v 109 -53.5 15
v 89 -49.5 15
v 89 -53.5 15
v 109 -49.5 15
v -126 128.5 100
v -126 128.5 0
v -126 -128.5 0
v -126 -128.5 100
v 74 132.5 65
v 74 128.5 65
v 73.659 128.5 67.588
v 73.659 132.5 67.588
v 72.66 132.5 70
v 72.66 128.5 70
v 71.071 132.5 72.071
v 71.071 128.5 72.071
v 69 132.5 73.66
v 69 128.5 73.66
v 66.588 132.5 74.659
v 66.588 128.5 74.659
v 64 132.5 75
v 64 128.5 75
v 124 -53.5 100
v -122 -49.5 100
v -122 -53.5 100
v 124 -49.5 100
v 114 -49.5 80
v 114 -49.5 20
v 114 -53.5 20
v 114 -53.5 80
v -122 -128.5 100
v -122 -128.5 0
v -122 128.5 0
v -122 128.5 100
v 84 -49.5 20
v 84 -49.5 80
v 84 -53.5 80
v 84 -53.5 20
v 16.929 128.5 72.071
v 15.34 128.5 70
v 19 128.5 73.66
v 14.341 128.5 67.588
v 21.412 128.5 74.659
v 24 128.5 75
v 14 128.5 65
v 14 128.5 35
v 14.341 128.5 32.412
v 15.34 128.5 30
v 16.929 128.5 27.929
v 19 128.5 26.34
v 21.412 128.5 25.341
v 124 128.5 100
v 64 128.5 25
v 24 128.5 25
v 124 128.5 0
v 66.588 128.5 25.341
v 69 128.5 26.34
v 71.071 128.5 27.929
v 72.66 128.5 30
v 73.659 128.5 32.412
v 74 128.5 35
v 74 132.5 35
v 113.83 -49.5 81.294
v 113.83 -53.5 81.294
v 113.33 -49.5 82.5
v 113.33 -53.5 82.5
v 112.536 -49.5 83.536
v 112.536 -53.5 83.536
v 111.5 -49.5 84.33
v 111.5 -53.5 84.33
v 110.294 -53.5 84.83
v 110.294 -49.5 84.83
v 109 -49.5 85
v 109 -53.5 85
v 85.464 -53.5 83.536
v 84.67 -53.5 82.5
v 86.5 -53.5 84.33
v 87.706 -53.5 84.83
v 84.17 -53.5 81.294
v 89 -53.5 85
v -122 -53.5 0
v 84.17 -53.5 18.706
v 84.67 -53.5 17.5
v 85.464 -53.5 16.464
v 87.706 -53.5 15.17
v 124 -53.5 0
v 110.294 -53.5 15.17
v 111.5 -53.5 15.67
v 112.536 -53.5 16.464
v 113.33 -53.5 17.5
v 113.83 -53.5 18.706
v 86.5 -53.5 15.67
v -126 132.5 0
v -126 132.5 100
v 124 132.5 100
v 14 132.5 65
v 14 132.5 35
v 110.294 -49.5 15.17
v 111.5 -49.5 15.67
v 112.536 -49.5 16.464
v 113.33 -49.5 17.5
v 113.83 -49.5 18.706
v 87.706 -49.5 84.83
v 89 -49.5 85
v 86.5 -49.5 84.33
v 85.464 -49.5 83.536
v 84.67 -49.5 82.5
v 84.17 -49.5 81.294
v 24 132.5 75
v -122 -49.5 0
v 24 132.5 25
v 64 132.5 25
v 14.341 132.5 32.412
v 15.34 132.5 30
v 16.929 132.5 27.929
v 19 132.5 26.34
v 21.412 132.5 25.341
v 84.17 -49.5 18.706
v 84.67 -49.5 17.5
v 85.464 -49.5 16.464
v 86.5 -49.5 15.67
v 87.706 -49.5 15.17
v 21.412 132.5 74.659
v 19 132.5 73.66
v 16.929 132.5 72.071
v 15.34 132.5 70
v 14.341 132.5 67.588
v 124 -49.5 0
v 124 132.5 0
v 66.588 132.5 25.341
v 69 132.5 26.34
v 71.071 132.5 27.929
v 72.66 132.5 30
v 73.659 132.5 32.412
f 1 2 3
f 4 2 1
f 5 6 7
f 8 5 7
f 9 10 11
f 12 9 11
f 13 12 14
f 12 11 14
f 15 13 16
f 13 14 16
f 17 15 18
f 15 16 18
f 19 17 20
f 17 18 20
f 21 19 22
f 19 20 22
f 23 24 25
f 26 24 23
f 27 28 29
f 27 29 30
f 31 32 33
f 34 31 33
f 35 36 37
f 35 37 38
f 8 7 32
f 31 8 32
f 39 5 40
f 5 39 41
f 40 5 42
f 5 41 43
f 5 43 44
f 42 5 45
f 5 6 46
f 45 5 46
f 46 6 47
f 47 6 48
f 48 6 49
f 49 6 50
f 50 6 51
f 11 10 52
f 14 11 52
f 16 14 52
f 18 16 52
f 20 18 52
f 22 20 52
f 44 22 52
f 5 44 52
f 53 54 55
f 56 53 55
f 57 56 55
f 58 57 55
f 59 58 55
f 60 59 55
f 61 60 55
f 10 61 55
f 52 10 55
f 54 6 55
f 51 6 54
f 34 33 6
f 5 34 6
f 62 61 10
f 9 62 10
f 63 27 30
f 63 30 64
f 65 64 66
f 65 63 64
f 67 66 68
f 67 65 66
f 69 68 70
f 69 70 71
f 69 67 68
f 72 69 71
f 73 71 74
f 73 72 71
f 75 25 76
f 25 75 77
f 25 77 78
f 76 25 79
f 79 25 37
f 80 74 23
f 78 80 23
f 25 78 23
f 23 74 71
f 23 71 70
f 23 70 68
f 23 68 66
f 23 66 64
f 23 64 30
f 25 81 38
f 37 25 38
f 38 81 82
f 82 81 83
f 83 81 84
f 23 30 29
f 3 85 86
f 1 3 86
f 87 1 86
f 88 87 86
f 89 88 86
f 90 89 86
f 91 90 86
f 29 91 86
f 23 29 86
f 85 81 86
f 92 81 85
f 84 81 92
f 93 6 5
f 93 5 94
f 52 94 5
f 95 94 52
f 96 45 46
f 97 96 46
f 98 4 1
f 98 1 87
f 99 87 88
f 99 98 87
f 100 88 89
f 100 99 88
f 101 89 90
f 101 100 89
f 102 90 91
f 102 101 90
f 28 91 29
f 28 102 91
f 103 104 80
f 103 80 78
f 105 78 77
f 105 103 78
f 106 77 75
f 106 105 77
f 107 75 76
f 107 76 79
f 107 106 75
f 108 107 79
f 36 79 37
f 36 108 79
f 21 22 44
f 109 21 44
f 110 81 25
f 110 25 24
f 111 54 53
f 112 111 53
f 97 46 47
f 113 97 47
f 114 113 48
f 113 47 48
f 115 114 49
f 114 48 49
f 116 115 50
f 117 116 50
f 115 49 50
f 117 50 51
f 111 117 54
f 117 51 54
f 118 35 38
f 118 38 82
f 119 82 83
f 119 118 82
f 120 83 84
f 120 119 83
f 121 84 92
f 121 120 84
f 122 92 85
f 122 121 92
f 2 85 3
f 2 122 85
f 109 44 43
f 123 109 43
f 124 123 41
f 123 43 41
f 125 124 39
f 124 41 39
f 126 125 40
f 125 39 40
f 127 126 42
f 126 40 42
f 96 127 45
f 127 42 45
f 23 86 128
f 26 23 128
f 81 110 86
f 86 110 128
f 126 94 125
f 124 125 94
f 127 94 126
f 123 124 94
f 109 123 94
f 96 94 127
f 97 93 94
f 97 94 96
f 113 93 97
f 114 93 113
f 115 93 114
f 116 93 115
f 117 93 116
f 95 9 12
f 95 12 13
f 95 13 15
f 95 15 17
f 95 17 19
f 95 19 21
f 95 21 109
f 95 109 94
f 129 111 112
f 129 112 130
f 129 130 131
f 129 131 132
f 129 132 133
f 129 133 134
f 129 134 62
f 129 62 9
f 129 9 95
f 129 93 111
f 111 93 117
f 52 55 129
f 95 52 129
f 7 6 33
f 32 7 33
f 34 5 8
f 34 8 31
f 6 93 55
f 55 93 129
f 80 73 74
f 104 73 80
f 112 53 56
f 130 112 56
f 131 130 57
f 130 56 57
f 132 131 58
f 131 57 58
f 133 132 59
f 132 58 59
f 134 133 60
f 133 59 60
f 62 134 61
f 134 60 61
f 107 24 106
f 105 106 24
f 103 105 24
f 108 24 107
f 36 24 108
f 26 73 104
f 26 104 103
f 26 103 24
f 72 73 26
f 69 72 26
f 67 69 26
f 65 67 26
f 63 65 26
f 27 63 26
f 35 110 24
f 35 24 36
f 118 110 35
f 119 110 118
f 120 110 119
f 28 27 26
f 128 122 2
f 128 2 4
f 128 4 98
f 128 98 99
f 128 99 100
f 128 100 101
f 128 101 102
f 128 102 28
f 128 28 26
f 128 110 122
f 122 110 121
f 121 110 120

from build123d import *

# Parameters (mm, degrees)
SKETCH1_W           = 250
SKETCH1_H           = 4
BOSS_EXTRUDE1_DEPTH = 100
BOSS_EXTRUDE2_DEPTH = 100
SKETCH1_4_W         = 246
SKETCH1_4_H         = 4
BOSS_EXTRUDE3_DEPTH = 100
CUT_EXTRUDE1_DEPTH  = 4
CUT_EXTRUDE2_START  = -4
CUT_EXTRUDE2_DEPTH  = 4


with BuildPart() as part:
    # Sketch1 → Boss-Extrude1 (new body)
    with BuildSketch(Plane.XY):
        with Locations((-1, 130.5)):
            Rectangle(SKETCH1_W, SKETCH1_H)
    extrude(amount=BOSS_EXTRUDE1_DEPTH)

    # Sketch3 → Cut-Extrude2 (cut)
    with BuildSketch(Plane(origin=(0, 132.5, 0), x_dir=(1, 0, 0), z_dir=(0, 1, 0)).offset(CUT_EXTRUDE2_START)):
        with BuildLine():
            Line((14, -65), (14, -35))
            ThreePointArc((14, -35), (16.928932188, -27.928932188), (24, -25))
            Line((24, -25), (64, -25))
            ThreePointArc((64, -25), (71.071067812, -27.928932188), (74, -35))
            Line((74, -35), (74, -65))
            ThreePointArc((74, -65), (71.071067812, -72.071067812), (64, -75))
            Line((64, -75), (24, -75))
            ThreePointArc((24, -75), (16.928932188, -72.071067812), (14, -65))
        make_face()
    extrude(amount=CUT_EXTRUDE2_DEPTH, mode=Mode.SUBTRACT)


with BuildPart() as body_2:
    # Sketch1<3> → Boss-Extrude2 (new body)
    with BuildSketch(Plane.XY):
        Polygon((-122, -128.5), (-122, -53.5), (-122, -49.5), (-122, 128.5), (-126, 128.5), (-126, -128.5), align=None)
    extrude(amount=BOSS_EXTRUDE2_DEPTH)


with BuildPart() as body_3:
    # Sketch1<4> → Boss-Extrude3 (new body)
    with BuildSketch(Plane.XY):
        with Locations((1, -51.5)):
            Rectangle(SKETCH1_4_W, SKETCH1_4_H)
    extrude(amount=BOSS_EXTRUDE3_DEPTH)

    # Sketch2 → Cut-Extrude1 (cut)
    with BuildSketch(Plane(origin=(0, -49.5, 0), x_dir=(1, 0, 0), z_dir=(0, 1, 0))):
        with BuildLine():
            Line((89, -15), (109, -15))
            ThreePointArc((109, -15), (112.535533906, -16.464466094), (114, -20))
            Line((114, -20), (114, -80))
            ThreePointArc((114, -80), (112.535533906, -83.535533906), (109, -85))
            Line((109, -85), (89, -85))
            ThreePointArc((89, -85), (85.464466094, -83.535533906), (84, -80))
            Line((84, -80), (84, -20))
            ThreePointArc((84, -20), (85.464466094, -16.464466094), (89, -15))
        make_face()
    extrude(amount=-CUT_EXTRUDE1_DEPTH, mode=Mode.SUBTRACT)


solid = Compound([part.part, body_2.part, body_3.part])
